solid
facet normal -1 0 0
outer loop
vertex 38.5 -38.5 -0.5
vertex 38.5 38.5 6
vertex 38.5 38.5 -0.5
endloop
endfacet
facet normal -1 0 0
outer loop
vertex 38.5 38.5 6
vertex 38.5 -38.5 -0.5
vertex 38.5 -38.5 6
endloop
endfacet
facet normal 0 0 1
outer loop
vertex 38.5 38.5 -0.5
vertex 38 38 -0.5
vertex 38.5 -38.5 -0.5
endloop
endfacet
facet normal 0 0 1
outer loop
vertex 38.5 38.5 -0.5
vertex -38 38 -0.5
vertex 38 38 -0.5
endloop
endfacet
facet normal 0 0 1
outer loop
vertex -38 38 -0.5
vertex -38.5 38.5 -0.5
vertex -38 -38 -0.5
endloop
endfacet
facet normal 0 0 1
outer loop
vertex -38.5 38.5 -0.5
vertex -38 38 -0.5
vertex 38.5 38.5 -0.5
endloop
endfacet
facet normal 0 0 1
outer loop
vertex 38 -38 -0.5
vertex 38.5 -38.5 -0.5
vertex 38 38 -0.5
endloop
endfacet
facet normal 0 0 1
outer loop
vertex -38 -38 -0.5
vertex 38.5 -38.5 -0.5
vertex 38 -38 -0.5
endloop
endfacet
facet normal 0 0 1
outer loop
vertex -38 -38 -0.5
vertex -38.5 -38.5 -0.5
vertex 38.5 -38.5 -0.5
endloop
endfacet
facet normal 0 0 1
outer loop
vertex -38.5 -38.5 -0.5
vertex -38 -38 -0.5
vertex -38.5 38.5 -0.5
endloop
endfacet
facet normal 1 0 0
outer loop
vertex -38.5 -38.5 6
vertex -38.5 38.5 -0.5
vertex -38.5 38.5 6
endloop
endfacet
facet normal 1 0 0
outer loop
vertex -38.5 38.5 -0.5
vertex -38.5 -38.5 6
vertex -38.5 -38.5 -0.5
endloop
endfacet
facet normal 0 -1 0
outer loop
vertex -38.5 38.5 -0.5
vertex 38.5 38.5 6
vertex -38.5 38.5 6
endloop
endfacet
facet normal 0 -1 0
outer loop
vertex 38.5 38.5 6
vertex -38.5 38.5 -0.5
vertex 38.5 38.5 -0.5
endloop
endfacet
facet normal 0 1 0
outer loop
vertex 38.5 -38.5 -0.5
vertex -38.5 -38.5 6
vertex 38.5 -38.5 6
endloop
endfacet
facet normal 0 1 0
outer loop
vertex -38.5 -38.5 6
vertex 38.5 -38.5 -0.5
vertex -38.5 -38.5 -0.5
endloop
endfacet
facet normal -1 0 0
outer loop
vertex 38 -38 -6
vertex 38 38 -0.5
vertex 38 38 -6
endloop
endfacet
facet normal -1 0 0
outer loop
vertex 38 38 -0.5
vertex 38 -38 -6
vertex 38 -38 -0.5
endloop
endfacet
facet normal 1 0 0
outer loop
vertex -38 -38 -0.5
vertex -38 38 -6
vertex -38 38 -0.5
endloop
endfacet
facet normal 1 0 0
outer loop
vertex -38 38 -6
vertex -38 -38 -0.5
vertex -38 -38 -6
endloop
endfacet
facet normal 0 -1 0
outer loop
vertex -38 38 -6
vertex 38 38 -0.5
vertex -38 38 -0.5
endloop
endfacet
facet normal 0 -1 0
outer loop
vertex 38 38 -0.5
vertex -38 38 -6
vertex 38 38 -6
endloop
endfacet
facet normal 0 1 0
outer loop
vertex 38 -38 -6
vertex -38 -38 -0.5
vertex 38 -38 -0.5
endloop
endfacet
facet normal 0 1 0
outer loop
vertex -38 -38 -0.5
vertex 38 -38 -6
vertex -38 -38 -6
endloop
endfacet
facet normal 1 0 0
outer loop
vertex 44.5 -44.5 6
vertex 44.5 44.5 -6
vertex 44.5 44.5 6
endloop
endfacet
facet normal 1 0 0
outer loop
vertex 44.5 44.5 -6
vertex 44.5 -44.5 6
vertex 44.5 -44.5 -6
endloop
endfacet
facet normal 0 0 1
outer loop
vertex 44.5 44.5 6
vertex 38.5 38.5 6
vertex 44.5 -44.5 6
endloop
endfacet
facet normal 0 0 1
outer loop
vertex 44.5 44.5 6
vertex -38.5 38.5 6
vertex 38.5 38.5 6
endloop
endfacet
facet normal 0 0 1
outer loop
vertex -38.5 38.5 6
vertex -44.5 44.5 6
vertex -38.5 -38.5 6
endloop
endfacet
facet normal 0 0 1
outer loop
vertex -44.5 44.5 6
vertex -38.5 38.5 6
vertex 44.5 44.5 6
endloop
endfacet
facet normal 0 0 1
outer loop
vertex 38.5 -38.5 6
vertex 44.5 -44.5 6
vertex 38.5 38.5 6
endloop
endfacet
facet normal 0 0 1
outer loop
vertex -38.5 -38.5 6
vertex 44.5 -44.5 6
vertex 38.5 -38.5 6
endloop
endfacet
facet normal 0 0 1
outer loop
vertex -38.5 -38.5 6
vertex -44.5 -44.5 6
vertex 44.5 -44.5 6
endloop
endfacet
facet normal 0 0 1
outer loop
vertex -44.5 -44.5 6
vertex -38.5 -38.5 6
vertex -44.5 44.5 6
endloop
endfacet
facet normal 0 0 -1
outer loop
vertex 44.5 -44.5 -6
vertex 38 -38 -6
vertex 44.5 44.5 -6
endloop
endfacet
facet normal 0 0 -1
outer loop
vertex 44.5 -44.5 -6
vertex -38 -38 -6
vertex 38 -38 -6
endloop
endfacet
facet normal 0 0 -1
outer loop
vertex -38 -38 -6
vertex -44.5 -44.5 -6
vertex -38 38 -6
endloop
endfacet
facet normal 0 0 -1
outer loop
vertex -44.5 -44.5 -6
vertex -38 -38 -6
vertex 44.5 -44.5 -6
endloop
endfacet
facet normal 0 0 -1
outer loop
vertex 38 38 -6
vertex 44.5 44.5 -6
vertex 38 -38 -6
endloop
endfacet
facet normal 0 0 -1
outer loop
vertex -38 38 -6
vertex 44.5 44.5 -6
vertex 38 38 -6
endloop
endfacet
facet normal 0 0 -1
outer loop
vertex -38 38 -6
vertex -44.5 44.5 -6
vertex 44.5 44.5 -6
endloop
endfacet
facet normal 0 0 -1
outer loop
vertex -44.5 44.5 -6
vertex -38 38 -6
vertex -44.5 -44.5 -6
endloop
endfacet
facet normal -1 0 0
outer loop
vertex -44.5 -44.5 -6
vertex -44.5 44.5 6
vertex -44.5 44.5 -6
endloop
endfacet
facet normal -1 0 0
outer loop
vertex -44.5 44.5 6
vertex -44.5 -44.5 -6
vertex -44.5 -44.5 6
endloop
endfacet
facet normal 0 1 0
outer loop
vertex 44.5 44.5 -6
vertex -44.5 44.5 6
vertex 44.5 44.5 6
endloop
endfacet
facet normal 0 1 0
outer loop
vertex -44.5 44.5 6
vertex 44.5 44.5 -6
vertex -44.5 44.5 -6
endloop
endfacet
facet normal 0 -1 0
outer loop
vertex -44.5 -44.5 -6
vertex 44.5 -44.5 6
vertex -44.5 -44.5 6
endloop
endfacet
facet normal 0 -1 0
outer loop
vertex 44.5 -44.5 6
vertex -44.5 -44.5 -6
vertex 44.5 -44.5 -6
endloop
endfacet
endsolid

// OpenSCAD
// This is a primer spacer. It makes adapts my primer tray funnel to smaller primer boxes.
//
// Warning -- some sanding and fitting may be required.
//
// This is licensed under the creative commons+attribution license
//
// To fulfil the attribution requirement, please link to:
// http://www.thingiverse.com/thing:2190725

/* [Main] */

// Define number of facets (large numbers provide better smoothing)
$fn=100;

// Define inside width of upper box in mm
inside_width=89.0;

// Define inside width of spacer box in mm
spacer_width=76.0;

// Define width of inside lip
lip_width=1.0;

// Define height of spacer box in mm
spacer_height=12.0;

module spacer_box()
{
	difference()
	{
		translate([0,0,0])                cube([inside_width,inside_width,spacer_height],center=true);
		union()
		{
			#translate([0,0,spacer_height/4])  cube([spacer_width+lip_width,spacer_width+lip_width,spacer_height/2+1],center=true);
			translate([0,0,-spacer_height/4]) cube([spacer_width,spacer_width,spacer_height/2+1],center=true);
		}
	}
	
}

spacer_box();
